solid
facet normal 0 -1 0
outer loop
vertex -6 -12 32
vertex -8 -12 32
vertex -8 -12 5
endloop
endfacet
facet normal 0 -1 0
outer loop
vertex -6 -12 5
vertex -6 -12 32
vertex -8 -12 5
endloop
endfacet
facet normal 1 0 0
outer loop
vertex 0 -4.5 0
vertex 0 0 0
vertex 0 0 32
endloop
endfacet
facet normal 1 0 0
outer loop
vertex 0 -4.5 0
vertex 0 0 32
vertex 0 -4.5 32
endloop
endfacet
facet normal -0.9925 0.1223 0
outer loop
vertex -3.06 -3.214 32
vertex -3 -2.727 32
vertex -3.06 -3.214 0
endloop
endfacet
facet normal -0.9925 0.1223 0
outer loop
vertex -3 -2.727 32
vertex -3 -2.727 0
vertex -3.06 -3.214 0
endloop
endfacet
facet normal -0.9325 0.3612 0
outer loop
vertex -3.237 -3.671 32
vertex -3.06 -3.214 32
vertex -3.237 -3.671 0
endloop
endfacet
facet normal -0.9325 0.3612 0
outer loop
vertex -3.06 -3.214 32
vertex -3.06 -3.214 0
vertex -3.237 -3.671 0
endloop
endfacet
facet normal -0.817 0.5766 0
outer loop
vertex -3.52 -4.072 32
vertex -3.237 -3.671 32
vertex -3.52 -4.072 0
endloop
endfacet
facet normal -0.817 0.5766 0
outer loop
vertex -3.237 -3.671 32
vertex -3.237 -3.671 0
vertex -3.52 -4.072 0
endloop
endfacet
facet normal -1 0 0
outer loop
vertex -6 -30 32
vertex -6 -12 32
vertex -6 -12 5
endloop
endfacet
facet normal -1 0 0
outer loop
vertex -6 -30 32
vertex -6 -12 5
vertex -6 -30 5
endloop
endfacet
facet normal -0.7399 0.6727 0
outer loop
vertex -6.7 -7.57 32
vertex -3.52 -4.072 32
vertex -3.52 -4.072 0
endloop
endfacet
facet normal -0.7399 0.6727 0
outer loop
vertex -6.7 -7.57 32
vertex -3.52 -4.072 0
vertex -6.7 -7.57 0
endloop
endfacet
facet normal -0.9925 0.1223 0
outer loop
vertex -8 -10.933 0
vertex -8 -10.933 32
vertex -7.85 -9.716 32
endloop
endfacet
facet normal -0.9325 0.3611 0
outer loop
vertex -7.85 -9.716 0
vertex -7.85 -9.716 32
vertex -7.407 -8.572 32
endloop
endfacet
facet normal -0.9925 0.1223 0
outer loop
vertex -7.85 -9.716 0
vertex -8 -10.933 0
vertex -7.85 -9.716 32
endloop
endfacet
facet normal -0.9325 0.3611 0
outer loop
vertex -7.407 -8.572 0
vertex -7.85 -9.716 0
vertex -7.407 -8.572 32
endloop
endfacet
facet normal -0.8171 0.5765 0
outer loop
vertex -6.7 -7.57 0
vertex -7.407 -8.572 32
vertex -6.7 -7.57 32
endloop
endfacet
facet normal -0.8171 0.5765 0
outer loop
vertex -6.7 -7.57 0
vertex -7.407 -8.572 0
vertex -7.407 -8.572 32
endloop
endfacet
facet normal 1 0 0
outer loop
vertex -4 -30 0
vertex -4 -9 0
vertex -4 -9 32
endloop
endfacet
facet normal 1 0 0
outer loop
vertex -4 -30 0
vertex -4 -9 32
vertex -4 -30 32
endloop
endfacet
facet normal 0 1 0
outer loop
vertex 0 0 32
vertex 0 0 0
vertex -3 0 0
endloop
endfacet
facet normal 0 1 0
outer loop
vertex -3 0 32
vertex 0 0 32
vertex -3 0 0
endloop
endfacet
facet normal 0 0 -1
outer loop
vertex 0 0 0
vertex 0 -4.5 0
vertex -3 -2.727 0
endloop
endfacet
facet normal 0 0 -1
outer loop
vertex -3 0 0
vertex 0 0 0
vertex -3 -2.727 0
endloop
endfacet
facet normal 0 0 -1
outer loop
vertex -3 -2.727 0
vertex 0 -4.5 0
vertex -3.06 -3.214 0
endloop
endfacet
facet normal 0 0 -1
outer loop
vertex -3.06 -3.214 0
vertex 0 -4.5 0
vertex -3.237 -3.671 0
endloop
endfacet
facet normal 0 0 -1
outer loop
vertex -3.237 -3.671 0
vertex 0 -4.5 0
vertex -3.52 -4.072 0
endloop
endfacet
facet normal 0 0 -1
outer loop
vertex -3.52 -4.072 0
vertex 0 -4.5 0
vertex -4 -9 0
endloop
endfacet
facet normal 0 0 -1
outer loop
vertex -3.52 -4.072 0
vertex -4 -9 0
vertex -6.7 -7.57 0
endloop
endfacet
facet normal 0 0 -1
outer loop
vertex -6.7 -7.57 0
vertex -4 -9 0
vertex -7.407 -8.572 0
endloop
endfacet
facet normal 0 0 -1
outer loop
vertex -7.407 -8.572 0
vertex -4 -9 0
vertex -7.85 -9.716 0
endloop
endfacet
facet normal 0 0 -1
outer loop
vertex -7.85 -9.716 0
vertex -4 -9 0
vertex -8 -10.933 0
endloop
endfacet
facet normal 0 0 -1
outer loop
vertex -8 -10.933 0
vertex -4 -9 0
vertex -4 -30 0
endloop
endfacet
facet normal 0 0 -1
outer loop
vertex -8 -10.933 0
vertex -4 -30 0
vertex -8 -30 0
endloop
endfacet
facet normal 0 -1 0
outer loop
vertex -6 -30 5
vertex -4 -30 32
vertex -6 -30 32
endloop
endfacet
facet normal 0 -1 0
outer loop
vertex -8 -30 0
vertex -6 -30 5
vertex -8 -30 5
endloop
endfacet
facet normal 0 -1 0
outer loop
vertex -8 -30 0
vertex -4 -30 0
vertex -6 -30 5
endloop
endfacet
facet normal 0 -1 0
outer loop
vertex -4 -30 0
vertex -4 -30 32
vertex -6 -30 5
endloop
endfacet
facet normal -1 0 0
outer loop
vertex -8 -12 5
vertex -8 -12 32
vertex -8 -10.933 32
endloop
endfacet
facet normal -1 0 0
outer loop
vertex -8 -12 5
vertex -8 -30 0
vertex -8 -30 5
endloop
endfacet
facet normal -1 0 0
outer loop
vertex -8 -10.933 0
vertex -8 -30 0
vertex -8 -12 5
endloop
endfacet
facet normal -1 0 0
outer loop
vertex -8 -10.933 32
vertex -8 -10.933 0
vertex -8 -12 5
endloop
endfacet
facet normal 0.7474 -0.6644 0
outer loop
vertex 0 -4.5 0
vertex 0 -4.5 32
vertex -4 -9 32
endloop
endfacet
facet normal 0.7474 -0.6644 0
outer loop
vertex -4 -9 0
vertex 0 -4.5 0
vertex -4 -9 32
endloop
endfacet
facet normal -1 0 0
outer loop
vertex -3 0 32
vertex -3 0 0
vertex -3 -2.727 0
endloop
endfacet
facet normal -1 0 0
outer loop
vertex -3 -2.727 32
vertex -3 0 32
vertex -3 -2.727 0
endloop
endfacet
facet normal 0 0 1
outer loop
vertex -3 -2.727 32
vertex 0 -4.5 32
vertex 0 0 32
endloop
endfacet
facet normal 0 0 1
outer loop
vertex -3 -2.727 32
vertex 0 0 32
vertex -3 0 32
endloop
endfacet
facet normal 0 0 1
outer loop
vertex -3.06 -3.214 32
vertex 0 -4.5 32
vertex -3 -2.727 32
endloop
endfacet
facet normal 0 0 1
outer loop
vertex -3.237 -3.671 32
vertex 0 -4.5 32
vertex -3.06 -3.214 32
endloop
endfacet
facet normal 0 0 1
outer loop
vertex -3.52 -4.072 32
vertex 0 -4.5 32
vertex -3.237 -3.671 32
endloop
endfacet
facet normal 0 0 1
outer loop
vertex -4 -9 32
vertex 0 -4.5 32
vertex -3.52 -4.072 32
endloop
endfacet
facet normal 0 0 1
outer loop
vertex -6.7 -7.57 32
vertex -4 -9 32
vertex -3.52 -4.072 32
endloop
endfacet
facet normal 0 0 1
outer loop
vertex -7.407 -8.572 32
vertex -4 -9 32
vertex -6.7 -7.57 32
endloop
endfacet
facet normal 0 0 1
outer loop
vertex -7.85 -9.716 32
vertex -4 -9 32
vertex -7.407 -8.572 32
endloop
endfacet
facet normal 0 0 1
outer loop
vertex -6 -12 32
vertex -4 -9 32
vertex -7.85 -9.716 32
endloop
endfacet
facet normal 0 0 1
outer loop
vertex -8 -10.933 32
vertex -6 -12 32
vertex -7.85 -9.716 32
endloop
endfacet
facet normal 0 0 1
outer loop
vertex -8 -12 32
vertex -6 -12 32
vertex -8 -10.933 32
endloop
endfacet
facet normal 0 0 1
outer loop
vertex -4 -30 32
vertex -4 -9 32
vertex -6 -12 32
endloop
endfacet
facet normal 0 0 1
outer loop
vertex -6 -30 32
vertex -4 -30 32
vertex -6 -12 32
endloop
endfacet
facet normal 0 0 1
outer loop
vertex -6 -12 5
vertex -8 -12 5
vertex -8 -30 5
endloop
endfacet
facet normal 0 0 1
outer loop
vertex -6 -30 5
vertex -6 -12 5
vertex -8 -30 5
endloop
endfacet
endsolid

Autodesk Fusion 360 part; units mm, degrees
sketch "Sketch1" plane through (0, 0, 0) normal (0, 0, 1) x (1, 0, 0)
  line L0 (0, 0) -> (0, -4.5)
  line L1 (-16, -9) -> (18, -9) construction
  line L2 (0, -4.5) -> (-4, -9)
  line L3 (-4, -9) -> (-4, -30)
  line L4 (0, 0) -> (-3, 0)
  line L5 (-3, 0) -> (-3, -2.7268)
  line L6 (-4, -30) -> (-8, -30)
  line L7 (-8, -30) -> (-8, -10.933)
  line L8 (-3.5201, -4.0721) -> (-6.6997, -7.5697)
  arc A0 (-3.5201, -4.0721) -> (-3, -2.7268) centre (-5, -2.7268) ccw
  arc A1 (-6.6997, -7.5697) -> (-8, -10.933) centre (-3, -10.933) ccw
  point P0 (-3, -3.5)
  dimension "d1" = 4.5
  dimension "d2" = 4.5
  dimension "d3" = 21
  dimension "d4" = 3
  dimension "d5" = 3.5
  dimension "d6" = 4
  dimension "d7" = 2
  dimension "d8" = 5
extrude "Extrude1" add sketch "Sketch1" along normal blind 32
sketch "Sketch2" plane through (-8, 0, 0) normal (-1, 0, 0) x (0, -1, 0)
  line L0 (10.933, 0) -> (30, 0)
  line L1 (30, 0) -> (30, 32)
  line L2 (30, 32) -> (10.933, 32)
  line L3 (10.933, 32) -> (10.933, 0)
  line L4 (30, 0) -> (15, 0)
  line L5 (15, 0) -> (15, 32)
  line L6 (15, 32) -> (30, 32)
  line L7 (30, 32) -> (30, 0)
  dimension "d11" = 15
extrude "Extrude2" add sketch "Sketch2" along normal blind 22 contours L0 L1 L2 L4 L5 L6 L7
extrude "Extrude3" cut 1 faces at (-30, -20, 21.3333) along direction (1, 0, 0) blind 2
extrude "Extrude4" add 1 faces at (-21.3333, -15, 10.6667) along direction (0, 1, 0) blind 4
extrude "Extrude5" cut 1 faces at (-21.3333, -11, 10.6667) along direction (0, -1, 0) blind 50
sketch "Sketch4" plane through (-8, 0, 0) normal (-1, 0, 0) x (0, -1, 0)
  line L0 (30, 0) -> (30, 32)
  line L1 (30, 32) -> (11, 32)
  line L2 (11, 32) -> (11, 0)
  line L3 (11, 0) -> (30, 0)
  line L4 (30, 32) -> (17, 32)
  line L5 (17, 32) -> (17, 5)
  line L6 (17, 5) -> (30, 5)
  line L7 (30, 5) -> (30, 32)
  dimension "d23" = 27
extrude "Extrude6" cut sketch "Sketch4" against normal blind 2 contours L0 L1 L4 L5 L6 L7
extrude "Extrude7" cut 1 faces at (-7.3333, -17, 23) along direction (0, 1, 0) blind 5
